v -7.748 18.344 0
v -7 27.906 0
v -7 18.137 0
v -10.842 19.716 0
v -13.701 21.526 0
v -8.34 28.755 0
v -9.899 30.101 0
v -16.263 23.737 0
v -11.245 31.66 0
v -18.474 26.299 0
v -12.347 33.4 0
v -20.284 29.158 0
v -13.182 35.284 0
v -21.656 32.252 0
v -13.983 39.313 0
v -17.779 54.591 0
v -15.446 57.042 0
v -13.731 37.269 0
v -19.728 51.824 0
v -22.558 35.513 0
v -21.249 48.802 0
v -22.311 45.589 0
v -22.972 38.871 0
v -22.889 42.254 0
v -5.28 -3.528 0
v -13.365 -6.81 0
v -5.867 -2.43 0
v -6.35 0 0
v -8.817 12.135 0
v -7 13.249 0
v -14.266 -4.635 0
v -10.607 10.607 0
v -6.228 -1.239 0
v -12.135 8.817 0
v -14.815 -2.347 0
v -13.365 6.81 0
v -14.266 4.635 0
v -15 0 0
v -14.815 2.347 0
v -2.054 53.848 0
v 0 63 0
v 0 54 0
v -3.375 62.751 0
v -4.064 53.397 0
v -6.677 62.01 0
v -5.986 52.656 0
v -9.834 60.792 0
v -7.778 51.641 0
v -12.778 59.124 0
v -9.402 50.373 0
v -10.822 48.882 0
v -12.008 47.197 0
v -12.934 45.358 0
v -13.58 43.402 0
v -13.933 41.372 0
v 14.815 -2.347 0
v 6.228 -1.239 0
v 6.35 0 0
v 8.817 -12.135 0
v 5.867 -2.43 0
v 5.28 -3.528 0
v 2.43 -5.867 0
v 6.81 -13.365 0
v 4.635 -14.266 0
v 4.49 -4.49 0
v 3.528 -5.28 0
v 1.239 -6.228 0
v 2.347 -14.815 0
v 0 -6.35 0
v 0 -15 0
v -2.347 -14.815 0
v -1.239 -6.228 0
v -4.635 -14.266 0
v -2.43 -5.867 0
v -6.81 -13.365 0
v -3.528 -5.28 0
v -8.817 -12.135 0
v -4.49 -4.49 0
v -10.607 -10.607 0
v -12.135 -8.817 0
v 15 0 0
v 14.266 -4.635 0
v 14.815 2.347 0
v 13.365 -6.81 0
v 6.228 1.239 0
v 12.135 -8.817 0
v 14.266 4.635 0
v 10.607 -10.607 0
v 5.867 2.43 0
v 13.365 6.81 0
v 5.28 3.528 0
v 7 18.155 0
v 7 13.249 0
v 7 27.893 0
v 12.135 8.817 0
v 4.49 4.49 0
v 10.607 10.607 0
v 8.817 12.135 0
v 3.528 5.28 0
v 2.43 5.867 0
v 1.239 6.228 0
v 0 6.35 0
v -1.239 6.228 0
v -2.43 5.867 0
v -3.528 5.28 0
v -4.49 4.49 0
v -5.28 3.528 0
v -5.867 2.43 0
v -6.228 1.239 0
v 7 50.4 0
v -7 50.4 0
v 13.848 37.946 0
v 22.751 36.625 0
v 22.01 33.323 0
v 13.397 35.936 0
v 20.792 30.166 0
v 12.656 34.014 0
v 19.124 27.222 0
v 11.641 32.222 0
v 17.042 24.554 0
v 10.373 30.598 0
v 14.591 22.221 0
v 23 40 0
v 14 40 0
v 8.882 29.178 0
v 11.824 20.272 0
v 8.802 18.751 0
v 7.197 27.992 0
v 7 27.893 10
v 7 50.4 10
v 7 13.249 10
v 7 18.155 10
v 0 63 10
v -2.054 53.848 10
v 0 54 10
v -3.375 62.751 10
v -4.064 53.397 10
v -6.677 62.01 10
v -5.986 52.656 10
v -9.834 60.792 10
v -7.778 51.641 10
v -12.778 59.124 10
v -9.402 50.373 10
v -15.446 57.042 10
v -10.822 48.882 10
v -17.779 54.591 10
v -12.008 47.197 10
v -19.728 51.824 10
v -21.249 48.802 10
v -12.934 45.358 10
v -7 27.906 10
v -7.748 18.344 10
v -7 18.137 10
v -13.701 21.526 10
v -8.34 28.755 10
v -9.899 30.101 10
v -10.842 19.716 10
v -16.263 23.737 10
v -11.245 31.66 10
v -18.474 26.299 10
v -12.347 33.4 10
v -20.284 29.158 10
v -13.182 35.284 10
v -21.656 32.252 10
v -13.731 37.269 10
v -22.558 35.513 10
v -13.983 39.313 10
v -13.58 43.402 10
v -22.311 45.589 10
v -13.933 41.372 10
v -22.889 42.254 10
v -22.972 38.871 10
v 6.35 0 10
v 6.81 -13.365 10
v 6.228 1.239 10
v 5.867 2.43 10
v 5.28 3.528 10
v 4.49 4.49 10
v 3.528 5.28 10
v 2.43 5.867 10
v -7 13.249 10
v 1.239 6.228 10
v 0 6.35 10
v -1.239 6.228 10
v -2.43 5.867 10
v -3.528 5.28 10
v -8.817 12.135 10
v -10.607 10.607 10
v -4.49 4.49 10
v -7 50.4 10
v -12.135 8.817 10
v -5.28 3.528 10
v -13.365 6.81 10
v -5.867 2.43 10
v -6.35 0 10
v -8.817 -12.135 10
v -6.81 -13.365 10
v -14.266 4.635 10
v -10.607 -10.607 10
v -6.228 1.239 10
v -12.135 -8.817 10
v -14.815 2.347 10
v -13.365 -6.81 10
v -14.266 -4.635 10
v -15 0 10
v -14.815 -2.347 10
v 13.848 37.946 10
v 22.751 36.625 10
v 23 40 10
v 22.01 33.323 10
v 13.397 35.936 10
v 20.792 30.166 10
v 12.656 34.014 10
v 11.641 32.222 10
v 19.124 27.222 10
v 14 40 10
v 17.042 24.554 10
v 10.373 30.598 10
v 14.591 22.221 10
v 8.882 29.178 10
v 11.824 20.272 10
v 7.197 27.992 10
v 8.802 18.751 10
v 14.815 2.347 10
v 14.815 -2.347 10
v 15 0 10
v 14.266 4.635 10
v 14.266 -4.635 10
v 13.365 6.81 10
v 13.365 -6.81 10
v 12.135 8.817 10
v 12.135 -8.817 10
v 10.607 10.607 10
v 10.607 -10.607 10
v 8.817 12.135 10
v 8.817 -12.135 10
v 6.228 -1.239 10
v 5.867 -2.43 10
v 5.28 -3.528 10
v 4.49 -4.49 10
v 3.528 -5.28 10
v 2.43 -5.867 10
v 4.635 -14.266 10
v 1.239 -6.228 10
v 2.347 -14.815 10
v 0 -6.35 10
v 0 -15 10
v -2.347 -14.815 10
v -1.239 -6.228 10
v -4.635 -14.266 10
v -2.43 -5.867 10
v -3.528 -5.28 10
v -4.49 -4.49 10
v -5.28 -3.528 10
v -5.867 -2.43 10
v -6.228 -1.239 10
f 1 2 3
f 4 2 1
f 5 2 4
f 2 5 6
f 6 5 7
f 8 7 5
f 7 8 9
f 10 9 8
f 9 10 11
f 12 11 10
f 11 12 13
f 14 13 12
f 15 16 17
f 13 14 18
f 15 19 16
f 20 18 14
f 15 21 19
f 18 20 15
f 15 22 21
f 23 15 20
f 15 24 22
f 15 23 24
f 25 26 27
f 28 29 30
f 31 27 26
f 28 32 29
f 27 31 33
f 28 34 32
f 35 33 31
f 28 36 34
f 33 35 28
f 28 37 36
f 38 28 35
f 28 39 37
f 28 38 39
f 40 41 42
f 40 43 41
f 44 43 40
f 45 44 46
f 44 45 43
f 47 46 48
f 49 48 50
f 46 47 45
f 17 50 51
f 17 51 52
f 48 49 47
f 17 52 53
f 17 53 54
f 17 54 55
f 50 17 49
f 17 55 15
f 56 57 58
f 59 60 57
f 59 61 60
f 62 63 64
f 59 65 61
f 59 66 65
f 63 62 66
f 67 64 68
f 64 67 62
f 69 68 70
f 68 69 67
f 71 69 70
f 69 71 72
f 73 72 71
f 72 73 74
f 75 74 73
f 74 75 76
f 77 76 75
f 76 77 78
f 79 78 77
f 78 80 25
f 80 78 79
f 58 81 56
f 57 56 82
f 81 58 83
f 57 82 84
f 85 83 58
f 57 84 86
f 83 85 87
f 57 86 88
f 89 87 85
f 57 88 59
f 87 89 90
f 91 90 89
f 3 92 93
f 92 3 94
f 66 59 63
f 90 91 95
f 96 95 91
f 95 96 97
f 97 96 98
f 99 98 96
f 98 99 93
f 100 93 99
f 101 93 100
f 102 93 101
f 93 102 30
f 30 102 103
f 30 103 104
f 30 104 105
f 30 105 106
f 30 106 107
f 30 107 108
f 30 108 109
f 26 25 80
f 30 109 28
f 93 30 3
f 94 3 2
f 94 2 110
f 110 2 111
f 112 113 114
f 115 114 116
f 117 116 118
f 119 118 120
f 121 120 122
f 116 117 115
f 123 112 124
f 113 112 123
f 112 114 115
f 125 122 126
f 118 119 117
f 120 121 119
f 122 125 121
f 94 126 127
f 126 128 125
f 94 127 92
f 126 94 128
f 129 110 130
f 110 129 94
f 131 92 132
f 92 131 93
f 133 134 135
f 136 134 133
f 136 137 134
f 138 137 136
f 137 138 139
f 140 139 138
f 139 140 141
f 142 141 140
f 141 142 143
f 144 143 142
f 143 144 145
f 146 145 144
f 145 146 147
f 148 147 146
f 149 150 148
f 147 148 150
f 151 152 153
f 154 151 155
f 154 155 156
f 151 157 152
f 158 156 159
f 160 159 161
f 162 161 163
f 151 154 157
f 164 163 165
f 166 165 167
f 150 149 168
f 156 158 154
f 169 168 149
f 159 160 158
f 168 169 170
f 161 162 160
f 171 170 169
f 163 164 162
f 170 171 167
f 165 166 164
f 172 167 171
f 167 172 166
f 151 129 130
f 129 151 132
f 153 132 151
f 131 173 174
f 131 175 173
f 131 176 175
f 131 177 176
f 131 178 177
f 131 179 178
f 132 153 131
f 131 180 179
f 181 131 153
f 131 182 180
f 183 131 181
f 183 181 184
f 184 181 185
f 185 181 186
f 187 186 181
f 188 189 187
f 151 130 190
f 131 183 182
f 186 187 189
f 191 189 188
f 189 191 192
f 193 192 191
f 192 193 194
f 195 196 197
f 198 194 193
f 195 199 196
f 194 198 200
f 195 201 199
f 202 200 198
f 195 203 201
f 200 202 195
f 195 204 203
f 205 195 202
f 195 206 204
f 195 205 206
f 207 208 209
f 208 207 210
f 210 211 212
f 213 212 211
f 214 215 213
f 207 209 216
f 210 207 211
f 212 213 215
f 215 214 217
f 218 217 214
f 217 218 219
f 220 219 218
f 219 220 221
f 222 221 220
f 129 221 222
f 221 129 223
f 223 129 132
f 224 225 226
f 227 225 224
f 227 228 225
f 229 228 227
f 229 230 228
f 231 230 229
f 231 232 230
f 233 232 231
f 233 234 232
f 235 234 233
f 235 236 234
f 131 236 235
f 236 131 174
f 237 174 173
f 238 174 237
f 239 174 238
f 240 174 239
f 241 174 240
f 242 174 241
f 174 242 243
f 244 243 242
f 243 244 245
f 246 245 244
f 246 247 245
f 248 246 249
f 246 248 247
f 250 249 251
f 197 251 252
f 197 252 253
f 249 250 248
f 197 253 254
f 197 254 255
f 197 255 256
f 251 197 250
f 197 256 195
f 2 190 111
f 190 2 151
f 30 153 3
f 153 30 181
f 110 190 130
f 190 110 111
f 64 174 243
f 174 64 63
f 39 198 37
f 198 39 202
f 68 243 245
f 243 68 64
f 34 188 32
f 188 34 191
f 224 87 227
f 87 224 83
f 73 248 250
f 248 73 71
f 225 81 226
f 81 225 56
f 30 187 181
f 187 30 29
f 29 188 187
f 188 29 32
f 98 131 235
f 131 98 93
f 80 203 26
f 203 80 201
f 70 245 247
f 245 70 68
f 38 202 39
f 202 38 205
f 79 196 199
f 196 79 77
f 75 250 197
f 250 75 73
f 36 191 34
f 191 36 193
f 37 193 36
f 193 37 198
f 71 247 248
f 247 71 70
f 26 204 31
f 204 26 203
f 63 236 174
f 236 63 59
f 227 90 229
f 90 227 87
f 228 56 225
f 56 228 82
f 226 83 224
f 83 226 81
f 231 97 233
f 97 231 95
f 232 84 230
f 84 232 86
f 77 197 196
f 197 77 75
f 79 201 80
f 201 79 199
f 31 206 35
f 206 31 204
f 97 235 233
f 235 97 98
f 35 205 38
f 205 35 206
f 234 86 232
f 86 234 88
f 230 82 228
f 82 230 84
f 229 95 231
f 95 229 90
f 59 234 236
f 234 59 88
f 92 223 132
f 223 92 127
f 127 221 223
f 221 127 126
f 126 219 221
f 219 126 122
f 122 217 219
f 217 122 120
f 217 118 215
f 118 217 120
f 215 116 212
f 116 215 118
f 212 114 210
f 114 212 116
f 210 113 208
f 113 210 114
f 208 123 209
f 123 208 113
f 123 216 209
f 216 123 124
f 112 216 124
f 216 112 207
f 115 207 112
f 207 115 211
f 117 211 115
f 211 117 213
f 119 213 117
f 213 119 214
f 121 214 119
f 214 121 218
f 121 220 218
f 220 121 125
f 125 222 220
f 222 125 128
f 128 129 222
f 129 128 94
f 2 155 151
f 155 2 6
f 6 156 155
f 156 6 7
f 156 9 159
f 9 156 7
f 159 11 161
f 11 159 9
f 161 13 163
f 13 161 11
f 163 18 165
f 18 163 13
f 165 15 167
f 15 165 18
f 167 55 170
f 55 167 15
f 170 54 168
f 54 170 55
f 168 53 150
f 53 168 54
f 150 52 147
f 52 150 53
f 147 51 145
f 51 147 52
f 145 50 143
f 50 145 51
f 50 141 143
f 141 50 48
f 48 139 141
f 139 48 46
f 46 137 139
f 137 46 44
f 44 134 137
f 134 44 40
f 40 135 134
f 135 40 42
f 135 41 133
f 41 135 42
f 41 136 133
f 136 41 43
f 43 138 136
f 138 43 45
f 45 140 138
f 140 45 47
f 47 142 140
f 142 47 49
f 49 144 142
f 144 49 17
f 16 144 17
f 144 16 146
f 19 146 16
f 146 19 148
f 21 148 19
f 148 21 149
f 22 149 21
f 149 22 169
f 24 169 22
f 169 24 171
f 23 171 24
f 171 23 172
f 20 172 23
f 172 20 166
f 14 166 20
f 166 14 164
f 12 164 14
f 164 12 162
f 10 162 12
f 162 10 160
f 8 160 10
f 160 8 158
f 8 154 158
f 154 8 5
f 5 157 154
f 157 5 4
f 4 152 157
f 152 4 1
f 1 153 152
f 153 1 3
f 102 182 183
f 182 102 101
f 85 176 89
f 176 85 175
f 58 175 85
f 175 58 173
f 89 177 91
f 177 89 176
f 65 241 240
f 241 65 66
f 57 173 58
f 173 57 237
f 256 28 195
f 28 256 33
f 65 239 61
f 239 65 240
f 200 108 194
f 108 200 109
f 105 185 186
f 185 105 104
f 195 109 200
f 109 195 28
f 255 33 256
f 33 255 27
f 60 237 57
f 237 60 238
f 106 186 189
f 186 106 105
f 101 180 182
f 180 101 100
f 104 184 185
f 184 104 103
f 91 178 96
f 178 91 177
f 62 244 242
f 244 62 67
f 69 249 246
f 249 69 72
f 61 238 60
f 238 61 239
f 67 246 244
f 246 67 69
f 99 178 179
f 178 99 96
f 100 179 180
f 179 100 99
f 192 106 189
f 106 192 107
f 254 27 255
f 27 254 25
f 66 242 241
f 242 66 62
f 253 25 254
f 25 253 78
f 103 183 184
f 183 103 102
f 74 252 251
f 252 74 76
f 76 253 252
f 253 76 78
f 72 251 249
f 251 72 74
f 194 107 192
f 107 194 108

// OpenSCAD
$fn = 32;

// ----------------------------------------------------------------------
// Hook: 80 mm shank into a 14 mm curl, 10 mm thick
// ----------------------------------------------------------------------

// --- parameters (mm) ---
shank_len = 80;           // shank length from the boss centre
shank_w = 14;             // shank width
boss_d = 30;              // boss diameter
bore_d = 12.7;            // boss bore
curl_in = 14;             // curl inner radius
curl_out = 23;            // curl outer radius
curl_sweep = 270;         // curl sweep angle
hook_t = 10;              // hook thickness

shank_profile = [[-7, 50.4], [7, 50.4], [7, 13], [-7, 13]];
boss_profile = [[15, 0], [14.815, 2.347], [14.266, 4.635], [13.365, 6.81], [12.135, 8.817], [10.607, 10.607], [8.817, 12.135], [6.81, 13.365], [4.635, 14.266], [2.347, 14.815], [0, 15], [-2.347, 14.815], [-4.635, 14.266], [-6.81, 13.365], [-8.817, 12.135], [-10.607, 10.607], [-12.135, 8.817], [-13.365, 6.81], [-14.266, 4.635], [-14.815, 2.347], [-15, 0], [-14.815, -2.347], [-14.266, -4.635], [-13.365, -6.81], [-12.135, -8.817], [-10.607, -10.607], [-8.817, -12.135], [-6.81, -13.365], [-4.635, -14.266], [-2.347, -14.815], [0, -15], [2.347, -14.815], [4.635, -14.266], [6.81, -13.365], [8.817, -12.135], [10.607, -10.607], [12.135, -8.817], [13.365, -6.81], [14.266, -4.635], [14.815, -2.347]];
curl_profile = [[0, 63], [-3.375, 62.751], [-6.677, 62.01], [-9.834, 60.792], [-12.778, 59.124], [-15.446, 57.042], [-17.779, 54.591], [-19.728, 51.824], [-21.249, 48.802], [-22.311, 45.589], [-22.889, 42.254], [-22.972, 38.871], [-22.558, 35.513], [-21.656, 32.252], [-20.284, 29.158], [-18.474, 26.299], [-16.263, 23.737], [-13.701, 21.526], [-10.842, 19.716], [-7.748, 18.344], [-4.487, 17.442], [-1.129, 17.028], [2.254, 17.111], [5.589, 17.689], [8.802, 18.751], [11.824, 20.272], [14.591, 22.221], [17.042, 24.554], [19.124, 27.222], [20.792, 30.166], [22.01, 33.323], [22.751, 36.625], [23, 40], [14, 40], [13.848, 37.946], [13.397, 35.936], [12.656, 34.014], [11.641, 32.222], [10.373, 30.598], [8.882, 29.178], [7.197, 27.992], [5.358, 27.066], [3.402, 26.42], [1.372, 26.067], [-0.687, 26.017], [-2.731, 26.269], [-4.716, 26.818], [-6.6, 27.653], [-8.34, 28.755], [-9.899, 30.101], [-11.245, 31.66], [-12.347, 33.4], [-13.182, 35.284], [-13.731, 37.269], [-13.983, 39.313], [-13.933, 41.372], [-13.58, 43.402], [-12.934, 45.358], [-12.008, 47.197], [-10.822, 48.882], [-9.402, 50.373], [-7.778, 51.641], [-5.986, 52.656], [-4.064, 53.397], [-2.054, 53.848], [0, 54]];

difference() {
  union() {
    /* three overlapping outlines: shank, boss and the smooth curl */
    linear_extrude(height = hook_t) polygon(shank_profile);
    linear_extrude(height = hook_t) polygon(boss_profile);
    linear_extrude(height = hook_t) polygon(curl_profile);
  }
  translate([0, 0, -2.5]) cylinder(h = hook_t + 5, d = bore_d);
}
